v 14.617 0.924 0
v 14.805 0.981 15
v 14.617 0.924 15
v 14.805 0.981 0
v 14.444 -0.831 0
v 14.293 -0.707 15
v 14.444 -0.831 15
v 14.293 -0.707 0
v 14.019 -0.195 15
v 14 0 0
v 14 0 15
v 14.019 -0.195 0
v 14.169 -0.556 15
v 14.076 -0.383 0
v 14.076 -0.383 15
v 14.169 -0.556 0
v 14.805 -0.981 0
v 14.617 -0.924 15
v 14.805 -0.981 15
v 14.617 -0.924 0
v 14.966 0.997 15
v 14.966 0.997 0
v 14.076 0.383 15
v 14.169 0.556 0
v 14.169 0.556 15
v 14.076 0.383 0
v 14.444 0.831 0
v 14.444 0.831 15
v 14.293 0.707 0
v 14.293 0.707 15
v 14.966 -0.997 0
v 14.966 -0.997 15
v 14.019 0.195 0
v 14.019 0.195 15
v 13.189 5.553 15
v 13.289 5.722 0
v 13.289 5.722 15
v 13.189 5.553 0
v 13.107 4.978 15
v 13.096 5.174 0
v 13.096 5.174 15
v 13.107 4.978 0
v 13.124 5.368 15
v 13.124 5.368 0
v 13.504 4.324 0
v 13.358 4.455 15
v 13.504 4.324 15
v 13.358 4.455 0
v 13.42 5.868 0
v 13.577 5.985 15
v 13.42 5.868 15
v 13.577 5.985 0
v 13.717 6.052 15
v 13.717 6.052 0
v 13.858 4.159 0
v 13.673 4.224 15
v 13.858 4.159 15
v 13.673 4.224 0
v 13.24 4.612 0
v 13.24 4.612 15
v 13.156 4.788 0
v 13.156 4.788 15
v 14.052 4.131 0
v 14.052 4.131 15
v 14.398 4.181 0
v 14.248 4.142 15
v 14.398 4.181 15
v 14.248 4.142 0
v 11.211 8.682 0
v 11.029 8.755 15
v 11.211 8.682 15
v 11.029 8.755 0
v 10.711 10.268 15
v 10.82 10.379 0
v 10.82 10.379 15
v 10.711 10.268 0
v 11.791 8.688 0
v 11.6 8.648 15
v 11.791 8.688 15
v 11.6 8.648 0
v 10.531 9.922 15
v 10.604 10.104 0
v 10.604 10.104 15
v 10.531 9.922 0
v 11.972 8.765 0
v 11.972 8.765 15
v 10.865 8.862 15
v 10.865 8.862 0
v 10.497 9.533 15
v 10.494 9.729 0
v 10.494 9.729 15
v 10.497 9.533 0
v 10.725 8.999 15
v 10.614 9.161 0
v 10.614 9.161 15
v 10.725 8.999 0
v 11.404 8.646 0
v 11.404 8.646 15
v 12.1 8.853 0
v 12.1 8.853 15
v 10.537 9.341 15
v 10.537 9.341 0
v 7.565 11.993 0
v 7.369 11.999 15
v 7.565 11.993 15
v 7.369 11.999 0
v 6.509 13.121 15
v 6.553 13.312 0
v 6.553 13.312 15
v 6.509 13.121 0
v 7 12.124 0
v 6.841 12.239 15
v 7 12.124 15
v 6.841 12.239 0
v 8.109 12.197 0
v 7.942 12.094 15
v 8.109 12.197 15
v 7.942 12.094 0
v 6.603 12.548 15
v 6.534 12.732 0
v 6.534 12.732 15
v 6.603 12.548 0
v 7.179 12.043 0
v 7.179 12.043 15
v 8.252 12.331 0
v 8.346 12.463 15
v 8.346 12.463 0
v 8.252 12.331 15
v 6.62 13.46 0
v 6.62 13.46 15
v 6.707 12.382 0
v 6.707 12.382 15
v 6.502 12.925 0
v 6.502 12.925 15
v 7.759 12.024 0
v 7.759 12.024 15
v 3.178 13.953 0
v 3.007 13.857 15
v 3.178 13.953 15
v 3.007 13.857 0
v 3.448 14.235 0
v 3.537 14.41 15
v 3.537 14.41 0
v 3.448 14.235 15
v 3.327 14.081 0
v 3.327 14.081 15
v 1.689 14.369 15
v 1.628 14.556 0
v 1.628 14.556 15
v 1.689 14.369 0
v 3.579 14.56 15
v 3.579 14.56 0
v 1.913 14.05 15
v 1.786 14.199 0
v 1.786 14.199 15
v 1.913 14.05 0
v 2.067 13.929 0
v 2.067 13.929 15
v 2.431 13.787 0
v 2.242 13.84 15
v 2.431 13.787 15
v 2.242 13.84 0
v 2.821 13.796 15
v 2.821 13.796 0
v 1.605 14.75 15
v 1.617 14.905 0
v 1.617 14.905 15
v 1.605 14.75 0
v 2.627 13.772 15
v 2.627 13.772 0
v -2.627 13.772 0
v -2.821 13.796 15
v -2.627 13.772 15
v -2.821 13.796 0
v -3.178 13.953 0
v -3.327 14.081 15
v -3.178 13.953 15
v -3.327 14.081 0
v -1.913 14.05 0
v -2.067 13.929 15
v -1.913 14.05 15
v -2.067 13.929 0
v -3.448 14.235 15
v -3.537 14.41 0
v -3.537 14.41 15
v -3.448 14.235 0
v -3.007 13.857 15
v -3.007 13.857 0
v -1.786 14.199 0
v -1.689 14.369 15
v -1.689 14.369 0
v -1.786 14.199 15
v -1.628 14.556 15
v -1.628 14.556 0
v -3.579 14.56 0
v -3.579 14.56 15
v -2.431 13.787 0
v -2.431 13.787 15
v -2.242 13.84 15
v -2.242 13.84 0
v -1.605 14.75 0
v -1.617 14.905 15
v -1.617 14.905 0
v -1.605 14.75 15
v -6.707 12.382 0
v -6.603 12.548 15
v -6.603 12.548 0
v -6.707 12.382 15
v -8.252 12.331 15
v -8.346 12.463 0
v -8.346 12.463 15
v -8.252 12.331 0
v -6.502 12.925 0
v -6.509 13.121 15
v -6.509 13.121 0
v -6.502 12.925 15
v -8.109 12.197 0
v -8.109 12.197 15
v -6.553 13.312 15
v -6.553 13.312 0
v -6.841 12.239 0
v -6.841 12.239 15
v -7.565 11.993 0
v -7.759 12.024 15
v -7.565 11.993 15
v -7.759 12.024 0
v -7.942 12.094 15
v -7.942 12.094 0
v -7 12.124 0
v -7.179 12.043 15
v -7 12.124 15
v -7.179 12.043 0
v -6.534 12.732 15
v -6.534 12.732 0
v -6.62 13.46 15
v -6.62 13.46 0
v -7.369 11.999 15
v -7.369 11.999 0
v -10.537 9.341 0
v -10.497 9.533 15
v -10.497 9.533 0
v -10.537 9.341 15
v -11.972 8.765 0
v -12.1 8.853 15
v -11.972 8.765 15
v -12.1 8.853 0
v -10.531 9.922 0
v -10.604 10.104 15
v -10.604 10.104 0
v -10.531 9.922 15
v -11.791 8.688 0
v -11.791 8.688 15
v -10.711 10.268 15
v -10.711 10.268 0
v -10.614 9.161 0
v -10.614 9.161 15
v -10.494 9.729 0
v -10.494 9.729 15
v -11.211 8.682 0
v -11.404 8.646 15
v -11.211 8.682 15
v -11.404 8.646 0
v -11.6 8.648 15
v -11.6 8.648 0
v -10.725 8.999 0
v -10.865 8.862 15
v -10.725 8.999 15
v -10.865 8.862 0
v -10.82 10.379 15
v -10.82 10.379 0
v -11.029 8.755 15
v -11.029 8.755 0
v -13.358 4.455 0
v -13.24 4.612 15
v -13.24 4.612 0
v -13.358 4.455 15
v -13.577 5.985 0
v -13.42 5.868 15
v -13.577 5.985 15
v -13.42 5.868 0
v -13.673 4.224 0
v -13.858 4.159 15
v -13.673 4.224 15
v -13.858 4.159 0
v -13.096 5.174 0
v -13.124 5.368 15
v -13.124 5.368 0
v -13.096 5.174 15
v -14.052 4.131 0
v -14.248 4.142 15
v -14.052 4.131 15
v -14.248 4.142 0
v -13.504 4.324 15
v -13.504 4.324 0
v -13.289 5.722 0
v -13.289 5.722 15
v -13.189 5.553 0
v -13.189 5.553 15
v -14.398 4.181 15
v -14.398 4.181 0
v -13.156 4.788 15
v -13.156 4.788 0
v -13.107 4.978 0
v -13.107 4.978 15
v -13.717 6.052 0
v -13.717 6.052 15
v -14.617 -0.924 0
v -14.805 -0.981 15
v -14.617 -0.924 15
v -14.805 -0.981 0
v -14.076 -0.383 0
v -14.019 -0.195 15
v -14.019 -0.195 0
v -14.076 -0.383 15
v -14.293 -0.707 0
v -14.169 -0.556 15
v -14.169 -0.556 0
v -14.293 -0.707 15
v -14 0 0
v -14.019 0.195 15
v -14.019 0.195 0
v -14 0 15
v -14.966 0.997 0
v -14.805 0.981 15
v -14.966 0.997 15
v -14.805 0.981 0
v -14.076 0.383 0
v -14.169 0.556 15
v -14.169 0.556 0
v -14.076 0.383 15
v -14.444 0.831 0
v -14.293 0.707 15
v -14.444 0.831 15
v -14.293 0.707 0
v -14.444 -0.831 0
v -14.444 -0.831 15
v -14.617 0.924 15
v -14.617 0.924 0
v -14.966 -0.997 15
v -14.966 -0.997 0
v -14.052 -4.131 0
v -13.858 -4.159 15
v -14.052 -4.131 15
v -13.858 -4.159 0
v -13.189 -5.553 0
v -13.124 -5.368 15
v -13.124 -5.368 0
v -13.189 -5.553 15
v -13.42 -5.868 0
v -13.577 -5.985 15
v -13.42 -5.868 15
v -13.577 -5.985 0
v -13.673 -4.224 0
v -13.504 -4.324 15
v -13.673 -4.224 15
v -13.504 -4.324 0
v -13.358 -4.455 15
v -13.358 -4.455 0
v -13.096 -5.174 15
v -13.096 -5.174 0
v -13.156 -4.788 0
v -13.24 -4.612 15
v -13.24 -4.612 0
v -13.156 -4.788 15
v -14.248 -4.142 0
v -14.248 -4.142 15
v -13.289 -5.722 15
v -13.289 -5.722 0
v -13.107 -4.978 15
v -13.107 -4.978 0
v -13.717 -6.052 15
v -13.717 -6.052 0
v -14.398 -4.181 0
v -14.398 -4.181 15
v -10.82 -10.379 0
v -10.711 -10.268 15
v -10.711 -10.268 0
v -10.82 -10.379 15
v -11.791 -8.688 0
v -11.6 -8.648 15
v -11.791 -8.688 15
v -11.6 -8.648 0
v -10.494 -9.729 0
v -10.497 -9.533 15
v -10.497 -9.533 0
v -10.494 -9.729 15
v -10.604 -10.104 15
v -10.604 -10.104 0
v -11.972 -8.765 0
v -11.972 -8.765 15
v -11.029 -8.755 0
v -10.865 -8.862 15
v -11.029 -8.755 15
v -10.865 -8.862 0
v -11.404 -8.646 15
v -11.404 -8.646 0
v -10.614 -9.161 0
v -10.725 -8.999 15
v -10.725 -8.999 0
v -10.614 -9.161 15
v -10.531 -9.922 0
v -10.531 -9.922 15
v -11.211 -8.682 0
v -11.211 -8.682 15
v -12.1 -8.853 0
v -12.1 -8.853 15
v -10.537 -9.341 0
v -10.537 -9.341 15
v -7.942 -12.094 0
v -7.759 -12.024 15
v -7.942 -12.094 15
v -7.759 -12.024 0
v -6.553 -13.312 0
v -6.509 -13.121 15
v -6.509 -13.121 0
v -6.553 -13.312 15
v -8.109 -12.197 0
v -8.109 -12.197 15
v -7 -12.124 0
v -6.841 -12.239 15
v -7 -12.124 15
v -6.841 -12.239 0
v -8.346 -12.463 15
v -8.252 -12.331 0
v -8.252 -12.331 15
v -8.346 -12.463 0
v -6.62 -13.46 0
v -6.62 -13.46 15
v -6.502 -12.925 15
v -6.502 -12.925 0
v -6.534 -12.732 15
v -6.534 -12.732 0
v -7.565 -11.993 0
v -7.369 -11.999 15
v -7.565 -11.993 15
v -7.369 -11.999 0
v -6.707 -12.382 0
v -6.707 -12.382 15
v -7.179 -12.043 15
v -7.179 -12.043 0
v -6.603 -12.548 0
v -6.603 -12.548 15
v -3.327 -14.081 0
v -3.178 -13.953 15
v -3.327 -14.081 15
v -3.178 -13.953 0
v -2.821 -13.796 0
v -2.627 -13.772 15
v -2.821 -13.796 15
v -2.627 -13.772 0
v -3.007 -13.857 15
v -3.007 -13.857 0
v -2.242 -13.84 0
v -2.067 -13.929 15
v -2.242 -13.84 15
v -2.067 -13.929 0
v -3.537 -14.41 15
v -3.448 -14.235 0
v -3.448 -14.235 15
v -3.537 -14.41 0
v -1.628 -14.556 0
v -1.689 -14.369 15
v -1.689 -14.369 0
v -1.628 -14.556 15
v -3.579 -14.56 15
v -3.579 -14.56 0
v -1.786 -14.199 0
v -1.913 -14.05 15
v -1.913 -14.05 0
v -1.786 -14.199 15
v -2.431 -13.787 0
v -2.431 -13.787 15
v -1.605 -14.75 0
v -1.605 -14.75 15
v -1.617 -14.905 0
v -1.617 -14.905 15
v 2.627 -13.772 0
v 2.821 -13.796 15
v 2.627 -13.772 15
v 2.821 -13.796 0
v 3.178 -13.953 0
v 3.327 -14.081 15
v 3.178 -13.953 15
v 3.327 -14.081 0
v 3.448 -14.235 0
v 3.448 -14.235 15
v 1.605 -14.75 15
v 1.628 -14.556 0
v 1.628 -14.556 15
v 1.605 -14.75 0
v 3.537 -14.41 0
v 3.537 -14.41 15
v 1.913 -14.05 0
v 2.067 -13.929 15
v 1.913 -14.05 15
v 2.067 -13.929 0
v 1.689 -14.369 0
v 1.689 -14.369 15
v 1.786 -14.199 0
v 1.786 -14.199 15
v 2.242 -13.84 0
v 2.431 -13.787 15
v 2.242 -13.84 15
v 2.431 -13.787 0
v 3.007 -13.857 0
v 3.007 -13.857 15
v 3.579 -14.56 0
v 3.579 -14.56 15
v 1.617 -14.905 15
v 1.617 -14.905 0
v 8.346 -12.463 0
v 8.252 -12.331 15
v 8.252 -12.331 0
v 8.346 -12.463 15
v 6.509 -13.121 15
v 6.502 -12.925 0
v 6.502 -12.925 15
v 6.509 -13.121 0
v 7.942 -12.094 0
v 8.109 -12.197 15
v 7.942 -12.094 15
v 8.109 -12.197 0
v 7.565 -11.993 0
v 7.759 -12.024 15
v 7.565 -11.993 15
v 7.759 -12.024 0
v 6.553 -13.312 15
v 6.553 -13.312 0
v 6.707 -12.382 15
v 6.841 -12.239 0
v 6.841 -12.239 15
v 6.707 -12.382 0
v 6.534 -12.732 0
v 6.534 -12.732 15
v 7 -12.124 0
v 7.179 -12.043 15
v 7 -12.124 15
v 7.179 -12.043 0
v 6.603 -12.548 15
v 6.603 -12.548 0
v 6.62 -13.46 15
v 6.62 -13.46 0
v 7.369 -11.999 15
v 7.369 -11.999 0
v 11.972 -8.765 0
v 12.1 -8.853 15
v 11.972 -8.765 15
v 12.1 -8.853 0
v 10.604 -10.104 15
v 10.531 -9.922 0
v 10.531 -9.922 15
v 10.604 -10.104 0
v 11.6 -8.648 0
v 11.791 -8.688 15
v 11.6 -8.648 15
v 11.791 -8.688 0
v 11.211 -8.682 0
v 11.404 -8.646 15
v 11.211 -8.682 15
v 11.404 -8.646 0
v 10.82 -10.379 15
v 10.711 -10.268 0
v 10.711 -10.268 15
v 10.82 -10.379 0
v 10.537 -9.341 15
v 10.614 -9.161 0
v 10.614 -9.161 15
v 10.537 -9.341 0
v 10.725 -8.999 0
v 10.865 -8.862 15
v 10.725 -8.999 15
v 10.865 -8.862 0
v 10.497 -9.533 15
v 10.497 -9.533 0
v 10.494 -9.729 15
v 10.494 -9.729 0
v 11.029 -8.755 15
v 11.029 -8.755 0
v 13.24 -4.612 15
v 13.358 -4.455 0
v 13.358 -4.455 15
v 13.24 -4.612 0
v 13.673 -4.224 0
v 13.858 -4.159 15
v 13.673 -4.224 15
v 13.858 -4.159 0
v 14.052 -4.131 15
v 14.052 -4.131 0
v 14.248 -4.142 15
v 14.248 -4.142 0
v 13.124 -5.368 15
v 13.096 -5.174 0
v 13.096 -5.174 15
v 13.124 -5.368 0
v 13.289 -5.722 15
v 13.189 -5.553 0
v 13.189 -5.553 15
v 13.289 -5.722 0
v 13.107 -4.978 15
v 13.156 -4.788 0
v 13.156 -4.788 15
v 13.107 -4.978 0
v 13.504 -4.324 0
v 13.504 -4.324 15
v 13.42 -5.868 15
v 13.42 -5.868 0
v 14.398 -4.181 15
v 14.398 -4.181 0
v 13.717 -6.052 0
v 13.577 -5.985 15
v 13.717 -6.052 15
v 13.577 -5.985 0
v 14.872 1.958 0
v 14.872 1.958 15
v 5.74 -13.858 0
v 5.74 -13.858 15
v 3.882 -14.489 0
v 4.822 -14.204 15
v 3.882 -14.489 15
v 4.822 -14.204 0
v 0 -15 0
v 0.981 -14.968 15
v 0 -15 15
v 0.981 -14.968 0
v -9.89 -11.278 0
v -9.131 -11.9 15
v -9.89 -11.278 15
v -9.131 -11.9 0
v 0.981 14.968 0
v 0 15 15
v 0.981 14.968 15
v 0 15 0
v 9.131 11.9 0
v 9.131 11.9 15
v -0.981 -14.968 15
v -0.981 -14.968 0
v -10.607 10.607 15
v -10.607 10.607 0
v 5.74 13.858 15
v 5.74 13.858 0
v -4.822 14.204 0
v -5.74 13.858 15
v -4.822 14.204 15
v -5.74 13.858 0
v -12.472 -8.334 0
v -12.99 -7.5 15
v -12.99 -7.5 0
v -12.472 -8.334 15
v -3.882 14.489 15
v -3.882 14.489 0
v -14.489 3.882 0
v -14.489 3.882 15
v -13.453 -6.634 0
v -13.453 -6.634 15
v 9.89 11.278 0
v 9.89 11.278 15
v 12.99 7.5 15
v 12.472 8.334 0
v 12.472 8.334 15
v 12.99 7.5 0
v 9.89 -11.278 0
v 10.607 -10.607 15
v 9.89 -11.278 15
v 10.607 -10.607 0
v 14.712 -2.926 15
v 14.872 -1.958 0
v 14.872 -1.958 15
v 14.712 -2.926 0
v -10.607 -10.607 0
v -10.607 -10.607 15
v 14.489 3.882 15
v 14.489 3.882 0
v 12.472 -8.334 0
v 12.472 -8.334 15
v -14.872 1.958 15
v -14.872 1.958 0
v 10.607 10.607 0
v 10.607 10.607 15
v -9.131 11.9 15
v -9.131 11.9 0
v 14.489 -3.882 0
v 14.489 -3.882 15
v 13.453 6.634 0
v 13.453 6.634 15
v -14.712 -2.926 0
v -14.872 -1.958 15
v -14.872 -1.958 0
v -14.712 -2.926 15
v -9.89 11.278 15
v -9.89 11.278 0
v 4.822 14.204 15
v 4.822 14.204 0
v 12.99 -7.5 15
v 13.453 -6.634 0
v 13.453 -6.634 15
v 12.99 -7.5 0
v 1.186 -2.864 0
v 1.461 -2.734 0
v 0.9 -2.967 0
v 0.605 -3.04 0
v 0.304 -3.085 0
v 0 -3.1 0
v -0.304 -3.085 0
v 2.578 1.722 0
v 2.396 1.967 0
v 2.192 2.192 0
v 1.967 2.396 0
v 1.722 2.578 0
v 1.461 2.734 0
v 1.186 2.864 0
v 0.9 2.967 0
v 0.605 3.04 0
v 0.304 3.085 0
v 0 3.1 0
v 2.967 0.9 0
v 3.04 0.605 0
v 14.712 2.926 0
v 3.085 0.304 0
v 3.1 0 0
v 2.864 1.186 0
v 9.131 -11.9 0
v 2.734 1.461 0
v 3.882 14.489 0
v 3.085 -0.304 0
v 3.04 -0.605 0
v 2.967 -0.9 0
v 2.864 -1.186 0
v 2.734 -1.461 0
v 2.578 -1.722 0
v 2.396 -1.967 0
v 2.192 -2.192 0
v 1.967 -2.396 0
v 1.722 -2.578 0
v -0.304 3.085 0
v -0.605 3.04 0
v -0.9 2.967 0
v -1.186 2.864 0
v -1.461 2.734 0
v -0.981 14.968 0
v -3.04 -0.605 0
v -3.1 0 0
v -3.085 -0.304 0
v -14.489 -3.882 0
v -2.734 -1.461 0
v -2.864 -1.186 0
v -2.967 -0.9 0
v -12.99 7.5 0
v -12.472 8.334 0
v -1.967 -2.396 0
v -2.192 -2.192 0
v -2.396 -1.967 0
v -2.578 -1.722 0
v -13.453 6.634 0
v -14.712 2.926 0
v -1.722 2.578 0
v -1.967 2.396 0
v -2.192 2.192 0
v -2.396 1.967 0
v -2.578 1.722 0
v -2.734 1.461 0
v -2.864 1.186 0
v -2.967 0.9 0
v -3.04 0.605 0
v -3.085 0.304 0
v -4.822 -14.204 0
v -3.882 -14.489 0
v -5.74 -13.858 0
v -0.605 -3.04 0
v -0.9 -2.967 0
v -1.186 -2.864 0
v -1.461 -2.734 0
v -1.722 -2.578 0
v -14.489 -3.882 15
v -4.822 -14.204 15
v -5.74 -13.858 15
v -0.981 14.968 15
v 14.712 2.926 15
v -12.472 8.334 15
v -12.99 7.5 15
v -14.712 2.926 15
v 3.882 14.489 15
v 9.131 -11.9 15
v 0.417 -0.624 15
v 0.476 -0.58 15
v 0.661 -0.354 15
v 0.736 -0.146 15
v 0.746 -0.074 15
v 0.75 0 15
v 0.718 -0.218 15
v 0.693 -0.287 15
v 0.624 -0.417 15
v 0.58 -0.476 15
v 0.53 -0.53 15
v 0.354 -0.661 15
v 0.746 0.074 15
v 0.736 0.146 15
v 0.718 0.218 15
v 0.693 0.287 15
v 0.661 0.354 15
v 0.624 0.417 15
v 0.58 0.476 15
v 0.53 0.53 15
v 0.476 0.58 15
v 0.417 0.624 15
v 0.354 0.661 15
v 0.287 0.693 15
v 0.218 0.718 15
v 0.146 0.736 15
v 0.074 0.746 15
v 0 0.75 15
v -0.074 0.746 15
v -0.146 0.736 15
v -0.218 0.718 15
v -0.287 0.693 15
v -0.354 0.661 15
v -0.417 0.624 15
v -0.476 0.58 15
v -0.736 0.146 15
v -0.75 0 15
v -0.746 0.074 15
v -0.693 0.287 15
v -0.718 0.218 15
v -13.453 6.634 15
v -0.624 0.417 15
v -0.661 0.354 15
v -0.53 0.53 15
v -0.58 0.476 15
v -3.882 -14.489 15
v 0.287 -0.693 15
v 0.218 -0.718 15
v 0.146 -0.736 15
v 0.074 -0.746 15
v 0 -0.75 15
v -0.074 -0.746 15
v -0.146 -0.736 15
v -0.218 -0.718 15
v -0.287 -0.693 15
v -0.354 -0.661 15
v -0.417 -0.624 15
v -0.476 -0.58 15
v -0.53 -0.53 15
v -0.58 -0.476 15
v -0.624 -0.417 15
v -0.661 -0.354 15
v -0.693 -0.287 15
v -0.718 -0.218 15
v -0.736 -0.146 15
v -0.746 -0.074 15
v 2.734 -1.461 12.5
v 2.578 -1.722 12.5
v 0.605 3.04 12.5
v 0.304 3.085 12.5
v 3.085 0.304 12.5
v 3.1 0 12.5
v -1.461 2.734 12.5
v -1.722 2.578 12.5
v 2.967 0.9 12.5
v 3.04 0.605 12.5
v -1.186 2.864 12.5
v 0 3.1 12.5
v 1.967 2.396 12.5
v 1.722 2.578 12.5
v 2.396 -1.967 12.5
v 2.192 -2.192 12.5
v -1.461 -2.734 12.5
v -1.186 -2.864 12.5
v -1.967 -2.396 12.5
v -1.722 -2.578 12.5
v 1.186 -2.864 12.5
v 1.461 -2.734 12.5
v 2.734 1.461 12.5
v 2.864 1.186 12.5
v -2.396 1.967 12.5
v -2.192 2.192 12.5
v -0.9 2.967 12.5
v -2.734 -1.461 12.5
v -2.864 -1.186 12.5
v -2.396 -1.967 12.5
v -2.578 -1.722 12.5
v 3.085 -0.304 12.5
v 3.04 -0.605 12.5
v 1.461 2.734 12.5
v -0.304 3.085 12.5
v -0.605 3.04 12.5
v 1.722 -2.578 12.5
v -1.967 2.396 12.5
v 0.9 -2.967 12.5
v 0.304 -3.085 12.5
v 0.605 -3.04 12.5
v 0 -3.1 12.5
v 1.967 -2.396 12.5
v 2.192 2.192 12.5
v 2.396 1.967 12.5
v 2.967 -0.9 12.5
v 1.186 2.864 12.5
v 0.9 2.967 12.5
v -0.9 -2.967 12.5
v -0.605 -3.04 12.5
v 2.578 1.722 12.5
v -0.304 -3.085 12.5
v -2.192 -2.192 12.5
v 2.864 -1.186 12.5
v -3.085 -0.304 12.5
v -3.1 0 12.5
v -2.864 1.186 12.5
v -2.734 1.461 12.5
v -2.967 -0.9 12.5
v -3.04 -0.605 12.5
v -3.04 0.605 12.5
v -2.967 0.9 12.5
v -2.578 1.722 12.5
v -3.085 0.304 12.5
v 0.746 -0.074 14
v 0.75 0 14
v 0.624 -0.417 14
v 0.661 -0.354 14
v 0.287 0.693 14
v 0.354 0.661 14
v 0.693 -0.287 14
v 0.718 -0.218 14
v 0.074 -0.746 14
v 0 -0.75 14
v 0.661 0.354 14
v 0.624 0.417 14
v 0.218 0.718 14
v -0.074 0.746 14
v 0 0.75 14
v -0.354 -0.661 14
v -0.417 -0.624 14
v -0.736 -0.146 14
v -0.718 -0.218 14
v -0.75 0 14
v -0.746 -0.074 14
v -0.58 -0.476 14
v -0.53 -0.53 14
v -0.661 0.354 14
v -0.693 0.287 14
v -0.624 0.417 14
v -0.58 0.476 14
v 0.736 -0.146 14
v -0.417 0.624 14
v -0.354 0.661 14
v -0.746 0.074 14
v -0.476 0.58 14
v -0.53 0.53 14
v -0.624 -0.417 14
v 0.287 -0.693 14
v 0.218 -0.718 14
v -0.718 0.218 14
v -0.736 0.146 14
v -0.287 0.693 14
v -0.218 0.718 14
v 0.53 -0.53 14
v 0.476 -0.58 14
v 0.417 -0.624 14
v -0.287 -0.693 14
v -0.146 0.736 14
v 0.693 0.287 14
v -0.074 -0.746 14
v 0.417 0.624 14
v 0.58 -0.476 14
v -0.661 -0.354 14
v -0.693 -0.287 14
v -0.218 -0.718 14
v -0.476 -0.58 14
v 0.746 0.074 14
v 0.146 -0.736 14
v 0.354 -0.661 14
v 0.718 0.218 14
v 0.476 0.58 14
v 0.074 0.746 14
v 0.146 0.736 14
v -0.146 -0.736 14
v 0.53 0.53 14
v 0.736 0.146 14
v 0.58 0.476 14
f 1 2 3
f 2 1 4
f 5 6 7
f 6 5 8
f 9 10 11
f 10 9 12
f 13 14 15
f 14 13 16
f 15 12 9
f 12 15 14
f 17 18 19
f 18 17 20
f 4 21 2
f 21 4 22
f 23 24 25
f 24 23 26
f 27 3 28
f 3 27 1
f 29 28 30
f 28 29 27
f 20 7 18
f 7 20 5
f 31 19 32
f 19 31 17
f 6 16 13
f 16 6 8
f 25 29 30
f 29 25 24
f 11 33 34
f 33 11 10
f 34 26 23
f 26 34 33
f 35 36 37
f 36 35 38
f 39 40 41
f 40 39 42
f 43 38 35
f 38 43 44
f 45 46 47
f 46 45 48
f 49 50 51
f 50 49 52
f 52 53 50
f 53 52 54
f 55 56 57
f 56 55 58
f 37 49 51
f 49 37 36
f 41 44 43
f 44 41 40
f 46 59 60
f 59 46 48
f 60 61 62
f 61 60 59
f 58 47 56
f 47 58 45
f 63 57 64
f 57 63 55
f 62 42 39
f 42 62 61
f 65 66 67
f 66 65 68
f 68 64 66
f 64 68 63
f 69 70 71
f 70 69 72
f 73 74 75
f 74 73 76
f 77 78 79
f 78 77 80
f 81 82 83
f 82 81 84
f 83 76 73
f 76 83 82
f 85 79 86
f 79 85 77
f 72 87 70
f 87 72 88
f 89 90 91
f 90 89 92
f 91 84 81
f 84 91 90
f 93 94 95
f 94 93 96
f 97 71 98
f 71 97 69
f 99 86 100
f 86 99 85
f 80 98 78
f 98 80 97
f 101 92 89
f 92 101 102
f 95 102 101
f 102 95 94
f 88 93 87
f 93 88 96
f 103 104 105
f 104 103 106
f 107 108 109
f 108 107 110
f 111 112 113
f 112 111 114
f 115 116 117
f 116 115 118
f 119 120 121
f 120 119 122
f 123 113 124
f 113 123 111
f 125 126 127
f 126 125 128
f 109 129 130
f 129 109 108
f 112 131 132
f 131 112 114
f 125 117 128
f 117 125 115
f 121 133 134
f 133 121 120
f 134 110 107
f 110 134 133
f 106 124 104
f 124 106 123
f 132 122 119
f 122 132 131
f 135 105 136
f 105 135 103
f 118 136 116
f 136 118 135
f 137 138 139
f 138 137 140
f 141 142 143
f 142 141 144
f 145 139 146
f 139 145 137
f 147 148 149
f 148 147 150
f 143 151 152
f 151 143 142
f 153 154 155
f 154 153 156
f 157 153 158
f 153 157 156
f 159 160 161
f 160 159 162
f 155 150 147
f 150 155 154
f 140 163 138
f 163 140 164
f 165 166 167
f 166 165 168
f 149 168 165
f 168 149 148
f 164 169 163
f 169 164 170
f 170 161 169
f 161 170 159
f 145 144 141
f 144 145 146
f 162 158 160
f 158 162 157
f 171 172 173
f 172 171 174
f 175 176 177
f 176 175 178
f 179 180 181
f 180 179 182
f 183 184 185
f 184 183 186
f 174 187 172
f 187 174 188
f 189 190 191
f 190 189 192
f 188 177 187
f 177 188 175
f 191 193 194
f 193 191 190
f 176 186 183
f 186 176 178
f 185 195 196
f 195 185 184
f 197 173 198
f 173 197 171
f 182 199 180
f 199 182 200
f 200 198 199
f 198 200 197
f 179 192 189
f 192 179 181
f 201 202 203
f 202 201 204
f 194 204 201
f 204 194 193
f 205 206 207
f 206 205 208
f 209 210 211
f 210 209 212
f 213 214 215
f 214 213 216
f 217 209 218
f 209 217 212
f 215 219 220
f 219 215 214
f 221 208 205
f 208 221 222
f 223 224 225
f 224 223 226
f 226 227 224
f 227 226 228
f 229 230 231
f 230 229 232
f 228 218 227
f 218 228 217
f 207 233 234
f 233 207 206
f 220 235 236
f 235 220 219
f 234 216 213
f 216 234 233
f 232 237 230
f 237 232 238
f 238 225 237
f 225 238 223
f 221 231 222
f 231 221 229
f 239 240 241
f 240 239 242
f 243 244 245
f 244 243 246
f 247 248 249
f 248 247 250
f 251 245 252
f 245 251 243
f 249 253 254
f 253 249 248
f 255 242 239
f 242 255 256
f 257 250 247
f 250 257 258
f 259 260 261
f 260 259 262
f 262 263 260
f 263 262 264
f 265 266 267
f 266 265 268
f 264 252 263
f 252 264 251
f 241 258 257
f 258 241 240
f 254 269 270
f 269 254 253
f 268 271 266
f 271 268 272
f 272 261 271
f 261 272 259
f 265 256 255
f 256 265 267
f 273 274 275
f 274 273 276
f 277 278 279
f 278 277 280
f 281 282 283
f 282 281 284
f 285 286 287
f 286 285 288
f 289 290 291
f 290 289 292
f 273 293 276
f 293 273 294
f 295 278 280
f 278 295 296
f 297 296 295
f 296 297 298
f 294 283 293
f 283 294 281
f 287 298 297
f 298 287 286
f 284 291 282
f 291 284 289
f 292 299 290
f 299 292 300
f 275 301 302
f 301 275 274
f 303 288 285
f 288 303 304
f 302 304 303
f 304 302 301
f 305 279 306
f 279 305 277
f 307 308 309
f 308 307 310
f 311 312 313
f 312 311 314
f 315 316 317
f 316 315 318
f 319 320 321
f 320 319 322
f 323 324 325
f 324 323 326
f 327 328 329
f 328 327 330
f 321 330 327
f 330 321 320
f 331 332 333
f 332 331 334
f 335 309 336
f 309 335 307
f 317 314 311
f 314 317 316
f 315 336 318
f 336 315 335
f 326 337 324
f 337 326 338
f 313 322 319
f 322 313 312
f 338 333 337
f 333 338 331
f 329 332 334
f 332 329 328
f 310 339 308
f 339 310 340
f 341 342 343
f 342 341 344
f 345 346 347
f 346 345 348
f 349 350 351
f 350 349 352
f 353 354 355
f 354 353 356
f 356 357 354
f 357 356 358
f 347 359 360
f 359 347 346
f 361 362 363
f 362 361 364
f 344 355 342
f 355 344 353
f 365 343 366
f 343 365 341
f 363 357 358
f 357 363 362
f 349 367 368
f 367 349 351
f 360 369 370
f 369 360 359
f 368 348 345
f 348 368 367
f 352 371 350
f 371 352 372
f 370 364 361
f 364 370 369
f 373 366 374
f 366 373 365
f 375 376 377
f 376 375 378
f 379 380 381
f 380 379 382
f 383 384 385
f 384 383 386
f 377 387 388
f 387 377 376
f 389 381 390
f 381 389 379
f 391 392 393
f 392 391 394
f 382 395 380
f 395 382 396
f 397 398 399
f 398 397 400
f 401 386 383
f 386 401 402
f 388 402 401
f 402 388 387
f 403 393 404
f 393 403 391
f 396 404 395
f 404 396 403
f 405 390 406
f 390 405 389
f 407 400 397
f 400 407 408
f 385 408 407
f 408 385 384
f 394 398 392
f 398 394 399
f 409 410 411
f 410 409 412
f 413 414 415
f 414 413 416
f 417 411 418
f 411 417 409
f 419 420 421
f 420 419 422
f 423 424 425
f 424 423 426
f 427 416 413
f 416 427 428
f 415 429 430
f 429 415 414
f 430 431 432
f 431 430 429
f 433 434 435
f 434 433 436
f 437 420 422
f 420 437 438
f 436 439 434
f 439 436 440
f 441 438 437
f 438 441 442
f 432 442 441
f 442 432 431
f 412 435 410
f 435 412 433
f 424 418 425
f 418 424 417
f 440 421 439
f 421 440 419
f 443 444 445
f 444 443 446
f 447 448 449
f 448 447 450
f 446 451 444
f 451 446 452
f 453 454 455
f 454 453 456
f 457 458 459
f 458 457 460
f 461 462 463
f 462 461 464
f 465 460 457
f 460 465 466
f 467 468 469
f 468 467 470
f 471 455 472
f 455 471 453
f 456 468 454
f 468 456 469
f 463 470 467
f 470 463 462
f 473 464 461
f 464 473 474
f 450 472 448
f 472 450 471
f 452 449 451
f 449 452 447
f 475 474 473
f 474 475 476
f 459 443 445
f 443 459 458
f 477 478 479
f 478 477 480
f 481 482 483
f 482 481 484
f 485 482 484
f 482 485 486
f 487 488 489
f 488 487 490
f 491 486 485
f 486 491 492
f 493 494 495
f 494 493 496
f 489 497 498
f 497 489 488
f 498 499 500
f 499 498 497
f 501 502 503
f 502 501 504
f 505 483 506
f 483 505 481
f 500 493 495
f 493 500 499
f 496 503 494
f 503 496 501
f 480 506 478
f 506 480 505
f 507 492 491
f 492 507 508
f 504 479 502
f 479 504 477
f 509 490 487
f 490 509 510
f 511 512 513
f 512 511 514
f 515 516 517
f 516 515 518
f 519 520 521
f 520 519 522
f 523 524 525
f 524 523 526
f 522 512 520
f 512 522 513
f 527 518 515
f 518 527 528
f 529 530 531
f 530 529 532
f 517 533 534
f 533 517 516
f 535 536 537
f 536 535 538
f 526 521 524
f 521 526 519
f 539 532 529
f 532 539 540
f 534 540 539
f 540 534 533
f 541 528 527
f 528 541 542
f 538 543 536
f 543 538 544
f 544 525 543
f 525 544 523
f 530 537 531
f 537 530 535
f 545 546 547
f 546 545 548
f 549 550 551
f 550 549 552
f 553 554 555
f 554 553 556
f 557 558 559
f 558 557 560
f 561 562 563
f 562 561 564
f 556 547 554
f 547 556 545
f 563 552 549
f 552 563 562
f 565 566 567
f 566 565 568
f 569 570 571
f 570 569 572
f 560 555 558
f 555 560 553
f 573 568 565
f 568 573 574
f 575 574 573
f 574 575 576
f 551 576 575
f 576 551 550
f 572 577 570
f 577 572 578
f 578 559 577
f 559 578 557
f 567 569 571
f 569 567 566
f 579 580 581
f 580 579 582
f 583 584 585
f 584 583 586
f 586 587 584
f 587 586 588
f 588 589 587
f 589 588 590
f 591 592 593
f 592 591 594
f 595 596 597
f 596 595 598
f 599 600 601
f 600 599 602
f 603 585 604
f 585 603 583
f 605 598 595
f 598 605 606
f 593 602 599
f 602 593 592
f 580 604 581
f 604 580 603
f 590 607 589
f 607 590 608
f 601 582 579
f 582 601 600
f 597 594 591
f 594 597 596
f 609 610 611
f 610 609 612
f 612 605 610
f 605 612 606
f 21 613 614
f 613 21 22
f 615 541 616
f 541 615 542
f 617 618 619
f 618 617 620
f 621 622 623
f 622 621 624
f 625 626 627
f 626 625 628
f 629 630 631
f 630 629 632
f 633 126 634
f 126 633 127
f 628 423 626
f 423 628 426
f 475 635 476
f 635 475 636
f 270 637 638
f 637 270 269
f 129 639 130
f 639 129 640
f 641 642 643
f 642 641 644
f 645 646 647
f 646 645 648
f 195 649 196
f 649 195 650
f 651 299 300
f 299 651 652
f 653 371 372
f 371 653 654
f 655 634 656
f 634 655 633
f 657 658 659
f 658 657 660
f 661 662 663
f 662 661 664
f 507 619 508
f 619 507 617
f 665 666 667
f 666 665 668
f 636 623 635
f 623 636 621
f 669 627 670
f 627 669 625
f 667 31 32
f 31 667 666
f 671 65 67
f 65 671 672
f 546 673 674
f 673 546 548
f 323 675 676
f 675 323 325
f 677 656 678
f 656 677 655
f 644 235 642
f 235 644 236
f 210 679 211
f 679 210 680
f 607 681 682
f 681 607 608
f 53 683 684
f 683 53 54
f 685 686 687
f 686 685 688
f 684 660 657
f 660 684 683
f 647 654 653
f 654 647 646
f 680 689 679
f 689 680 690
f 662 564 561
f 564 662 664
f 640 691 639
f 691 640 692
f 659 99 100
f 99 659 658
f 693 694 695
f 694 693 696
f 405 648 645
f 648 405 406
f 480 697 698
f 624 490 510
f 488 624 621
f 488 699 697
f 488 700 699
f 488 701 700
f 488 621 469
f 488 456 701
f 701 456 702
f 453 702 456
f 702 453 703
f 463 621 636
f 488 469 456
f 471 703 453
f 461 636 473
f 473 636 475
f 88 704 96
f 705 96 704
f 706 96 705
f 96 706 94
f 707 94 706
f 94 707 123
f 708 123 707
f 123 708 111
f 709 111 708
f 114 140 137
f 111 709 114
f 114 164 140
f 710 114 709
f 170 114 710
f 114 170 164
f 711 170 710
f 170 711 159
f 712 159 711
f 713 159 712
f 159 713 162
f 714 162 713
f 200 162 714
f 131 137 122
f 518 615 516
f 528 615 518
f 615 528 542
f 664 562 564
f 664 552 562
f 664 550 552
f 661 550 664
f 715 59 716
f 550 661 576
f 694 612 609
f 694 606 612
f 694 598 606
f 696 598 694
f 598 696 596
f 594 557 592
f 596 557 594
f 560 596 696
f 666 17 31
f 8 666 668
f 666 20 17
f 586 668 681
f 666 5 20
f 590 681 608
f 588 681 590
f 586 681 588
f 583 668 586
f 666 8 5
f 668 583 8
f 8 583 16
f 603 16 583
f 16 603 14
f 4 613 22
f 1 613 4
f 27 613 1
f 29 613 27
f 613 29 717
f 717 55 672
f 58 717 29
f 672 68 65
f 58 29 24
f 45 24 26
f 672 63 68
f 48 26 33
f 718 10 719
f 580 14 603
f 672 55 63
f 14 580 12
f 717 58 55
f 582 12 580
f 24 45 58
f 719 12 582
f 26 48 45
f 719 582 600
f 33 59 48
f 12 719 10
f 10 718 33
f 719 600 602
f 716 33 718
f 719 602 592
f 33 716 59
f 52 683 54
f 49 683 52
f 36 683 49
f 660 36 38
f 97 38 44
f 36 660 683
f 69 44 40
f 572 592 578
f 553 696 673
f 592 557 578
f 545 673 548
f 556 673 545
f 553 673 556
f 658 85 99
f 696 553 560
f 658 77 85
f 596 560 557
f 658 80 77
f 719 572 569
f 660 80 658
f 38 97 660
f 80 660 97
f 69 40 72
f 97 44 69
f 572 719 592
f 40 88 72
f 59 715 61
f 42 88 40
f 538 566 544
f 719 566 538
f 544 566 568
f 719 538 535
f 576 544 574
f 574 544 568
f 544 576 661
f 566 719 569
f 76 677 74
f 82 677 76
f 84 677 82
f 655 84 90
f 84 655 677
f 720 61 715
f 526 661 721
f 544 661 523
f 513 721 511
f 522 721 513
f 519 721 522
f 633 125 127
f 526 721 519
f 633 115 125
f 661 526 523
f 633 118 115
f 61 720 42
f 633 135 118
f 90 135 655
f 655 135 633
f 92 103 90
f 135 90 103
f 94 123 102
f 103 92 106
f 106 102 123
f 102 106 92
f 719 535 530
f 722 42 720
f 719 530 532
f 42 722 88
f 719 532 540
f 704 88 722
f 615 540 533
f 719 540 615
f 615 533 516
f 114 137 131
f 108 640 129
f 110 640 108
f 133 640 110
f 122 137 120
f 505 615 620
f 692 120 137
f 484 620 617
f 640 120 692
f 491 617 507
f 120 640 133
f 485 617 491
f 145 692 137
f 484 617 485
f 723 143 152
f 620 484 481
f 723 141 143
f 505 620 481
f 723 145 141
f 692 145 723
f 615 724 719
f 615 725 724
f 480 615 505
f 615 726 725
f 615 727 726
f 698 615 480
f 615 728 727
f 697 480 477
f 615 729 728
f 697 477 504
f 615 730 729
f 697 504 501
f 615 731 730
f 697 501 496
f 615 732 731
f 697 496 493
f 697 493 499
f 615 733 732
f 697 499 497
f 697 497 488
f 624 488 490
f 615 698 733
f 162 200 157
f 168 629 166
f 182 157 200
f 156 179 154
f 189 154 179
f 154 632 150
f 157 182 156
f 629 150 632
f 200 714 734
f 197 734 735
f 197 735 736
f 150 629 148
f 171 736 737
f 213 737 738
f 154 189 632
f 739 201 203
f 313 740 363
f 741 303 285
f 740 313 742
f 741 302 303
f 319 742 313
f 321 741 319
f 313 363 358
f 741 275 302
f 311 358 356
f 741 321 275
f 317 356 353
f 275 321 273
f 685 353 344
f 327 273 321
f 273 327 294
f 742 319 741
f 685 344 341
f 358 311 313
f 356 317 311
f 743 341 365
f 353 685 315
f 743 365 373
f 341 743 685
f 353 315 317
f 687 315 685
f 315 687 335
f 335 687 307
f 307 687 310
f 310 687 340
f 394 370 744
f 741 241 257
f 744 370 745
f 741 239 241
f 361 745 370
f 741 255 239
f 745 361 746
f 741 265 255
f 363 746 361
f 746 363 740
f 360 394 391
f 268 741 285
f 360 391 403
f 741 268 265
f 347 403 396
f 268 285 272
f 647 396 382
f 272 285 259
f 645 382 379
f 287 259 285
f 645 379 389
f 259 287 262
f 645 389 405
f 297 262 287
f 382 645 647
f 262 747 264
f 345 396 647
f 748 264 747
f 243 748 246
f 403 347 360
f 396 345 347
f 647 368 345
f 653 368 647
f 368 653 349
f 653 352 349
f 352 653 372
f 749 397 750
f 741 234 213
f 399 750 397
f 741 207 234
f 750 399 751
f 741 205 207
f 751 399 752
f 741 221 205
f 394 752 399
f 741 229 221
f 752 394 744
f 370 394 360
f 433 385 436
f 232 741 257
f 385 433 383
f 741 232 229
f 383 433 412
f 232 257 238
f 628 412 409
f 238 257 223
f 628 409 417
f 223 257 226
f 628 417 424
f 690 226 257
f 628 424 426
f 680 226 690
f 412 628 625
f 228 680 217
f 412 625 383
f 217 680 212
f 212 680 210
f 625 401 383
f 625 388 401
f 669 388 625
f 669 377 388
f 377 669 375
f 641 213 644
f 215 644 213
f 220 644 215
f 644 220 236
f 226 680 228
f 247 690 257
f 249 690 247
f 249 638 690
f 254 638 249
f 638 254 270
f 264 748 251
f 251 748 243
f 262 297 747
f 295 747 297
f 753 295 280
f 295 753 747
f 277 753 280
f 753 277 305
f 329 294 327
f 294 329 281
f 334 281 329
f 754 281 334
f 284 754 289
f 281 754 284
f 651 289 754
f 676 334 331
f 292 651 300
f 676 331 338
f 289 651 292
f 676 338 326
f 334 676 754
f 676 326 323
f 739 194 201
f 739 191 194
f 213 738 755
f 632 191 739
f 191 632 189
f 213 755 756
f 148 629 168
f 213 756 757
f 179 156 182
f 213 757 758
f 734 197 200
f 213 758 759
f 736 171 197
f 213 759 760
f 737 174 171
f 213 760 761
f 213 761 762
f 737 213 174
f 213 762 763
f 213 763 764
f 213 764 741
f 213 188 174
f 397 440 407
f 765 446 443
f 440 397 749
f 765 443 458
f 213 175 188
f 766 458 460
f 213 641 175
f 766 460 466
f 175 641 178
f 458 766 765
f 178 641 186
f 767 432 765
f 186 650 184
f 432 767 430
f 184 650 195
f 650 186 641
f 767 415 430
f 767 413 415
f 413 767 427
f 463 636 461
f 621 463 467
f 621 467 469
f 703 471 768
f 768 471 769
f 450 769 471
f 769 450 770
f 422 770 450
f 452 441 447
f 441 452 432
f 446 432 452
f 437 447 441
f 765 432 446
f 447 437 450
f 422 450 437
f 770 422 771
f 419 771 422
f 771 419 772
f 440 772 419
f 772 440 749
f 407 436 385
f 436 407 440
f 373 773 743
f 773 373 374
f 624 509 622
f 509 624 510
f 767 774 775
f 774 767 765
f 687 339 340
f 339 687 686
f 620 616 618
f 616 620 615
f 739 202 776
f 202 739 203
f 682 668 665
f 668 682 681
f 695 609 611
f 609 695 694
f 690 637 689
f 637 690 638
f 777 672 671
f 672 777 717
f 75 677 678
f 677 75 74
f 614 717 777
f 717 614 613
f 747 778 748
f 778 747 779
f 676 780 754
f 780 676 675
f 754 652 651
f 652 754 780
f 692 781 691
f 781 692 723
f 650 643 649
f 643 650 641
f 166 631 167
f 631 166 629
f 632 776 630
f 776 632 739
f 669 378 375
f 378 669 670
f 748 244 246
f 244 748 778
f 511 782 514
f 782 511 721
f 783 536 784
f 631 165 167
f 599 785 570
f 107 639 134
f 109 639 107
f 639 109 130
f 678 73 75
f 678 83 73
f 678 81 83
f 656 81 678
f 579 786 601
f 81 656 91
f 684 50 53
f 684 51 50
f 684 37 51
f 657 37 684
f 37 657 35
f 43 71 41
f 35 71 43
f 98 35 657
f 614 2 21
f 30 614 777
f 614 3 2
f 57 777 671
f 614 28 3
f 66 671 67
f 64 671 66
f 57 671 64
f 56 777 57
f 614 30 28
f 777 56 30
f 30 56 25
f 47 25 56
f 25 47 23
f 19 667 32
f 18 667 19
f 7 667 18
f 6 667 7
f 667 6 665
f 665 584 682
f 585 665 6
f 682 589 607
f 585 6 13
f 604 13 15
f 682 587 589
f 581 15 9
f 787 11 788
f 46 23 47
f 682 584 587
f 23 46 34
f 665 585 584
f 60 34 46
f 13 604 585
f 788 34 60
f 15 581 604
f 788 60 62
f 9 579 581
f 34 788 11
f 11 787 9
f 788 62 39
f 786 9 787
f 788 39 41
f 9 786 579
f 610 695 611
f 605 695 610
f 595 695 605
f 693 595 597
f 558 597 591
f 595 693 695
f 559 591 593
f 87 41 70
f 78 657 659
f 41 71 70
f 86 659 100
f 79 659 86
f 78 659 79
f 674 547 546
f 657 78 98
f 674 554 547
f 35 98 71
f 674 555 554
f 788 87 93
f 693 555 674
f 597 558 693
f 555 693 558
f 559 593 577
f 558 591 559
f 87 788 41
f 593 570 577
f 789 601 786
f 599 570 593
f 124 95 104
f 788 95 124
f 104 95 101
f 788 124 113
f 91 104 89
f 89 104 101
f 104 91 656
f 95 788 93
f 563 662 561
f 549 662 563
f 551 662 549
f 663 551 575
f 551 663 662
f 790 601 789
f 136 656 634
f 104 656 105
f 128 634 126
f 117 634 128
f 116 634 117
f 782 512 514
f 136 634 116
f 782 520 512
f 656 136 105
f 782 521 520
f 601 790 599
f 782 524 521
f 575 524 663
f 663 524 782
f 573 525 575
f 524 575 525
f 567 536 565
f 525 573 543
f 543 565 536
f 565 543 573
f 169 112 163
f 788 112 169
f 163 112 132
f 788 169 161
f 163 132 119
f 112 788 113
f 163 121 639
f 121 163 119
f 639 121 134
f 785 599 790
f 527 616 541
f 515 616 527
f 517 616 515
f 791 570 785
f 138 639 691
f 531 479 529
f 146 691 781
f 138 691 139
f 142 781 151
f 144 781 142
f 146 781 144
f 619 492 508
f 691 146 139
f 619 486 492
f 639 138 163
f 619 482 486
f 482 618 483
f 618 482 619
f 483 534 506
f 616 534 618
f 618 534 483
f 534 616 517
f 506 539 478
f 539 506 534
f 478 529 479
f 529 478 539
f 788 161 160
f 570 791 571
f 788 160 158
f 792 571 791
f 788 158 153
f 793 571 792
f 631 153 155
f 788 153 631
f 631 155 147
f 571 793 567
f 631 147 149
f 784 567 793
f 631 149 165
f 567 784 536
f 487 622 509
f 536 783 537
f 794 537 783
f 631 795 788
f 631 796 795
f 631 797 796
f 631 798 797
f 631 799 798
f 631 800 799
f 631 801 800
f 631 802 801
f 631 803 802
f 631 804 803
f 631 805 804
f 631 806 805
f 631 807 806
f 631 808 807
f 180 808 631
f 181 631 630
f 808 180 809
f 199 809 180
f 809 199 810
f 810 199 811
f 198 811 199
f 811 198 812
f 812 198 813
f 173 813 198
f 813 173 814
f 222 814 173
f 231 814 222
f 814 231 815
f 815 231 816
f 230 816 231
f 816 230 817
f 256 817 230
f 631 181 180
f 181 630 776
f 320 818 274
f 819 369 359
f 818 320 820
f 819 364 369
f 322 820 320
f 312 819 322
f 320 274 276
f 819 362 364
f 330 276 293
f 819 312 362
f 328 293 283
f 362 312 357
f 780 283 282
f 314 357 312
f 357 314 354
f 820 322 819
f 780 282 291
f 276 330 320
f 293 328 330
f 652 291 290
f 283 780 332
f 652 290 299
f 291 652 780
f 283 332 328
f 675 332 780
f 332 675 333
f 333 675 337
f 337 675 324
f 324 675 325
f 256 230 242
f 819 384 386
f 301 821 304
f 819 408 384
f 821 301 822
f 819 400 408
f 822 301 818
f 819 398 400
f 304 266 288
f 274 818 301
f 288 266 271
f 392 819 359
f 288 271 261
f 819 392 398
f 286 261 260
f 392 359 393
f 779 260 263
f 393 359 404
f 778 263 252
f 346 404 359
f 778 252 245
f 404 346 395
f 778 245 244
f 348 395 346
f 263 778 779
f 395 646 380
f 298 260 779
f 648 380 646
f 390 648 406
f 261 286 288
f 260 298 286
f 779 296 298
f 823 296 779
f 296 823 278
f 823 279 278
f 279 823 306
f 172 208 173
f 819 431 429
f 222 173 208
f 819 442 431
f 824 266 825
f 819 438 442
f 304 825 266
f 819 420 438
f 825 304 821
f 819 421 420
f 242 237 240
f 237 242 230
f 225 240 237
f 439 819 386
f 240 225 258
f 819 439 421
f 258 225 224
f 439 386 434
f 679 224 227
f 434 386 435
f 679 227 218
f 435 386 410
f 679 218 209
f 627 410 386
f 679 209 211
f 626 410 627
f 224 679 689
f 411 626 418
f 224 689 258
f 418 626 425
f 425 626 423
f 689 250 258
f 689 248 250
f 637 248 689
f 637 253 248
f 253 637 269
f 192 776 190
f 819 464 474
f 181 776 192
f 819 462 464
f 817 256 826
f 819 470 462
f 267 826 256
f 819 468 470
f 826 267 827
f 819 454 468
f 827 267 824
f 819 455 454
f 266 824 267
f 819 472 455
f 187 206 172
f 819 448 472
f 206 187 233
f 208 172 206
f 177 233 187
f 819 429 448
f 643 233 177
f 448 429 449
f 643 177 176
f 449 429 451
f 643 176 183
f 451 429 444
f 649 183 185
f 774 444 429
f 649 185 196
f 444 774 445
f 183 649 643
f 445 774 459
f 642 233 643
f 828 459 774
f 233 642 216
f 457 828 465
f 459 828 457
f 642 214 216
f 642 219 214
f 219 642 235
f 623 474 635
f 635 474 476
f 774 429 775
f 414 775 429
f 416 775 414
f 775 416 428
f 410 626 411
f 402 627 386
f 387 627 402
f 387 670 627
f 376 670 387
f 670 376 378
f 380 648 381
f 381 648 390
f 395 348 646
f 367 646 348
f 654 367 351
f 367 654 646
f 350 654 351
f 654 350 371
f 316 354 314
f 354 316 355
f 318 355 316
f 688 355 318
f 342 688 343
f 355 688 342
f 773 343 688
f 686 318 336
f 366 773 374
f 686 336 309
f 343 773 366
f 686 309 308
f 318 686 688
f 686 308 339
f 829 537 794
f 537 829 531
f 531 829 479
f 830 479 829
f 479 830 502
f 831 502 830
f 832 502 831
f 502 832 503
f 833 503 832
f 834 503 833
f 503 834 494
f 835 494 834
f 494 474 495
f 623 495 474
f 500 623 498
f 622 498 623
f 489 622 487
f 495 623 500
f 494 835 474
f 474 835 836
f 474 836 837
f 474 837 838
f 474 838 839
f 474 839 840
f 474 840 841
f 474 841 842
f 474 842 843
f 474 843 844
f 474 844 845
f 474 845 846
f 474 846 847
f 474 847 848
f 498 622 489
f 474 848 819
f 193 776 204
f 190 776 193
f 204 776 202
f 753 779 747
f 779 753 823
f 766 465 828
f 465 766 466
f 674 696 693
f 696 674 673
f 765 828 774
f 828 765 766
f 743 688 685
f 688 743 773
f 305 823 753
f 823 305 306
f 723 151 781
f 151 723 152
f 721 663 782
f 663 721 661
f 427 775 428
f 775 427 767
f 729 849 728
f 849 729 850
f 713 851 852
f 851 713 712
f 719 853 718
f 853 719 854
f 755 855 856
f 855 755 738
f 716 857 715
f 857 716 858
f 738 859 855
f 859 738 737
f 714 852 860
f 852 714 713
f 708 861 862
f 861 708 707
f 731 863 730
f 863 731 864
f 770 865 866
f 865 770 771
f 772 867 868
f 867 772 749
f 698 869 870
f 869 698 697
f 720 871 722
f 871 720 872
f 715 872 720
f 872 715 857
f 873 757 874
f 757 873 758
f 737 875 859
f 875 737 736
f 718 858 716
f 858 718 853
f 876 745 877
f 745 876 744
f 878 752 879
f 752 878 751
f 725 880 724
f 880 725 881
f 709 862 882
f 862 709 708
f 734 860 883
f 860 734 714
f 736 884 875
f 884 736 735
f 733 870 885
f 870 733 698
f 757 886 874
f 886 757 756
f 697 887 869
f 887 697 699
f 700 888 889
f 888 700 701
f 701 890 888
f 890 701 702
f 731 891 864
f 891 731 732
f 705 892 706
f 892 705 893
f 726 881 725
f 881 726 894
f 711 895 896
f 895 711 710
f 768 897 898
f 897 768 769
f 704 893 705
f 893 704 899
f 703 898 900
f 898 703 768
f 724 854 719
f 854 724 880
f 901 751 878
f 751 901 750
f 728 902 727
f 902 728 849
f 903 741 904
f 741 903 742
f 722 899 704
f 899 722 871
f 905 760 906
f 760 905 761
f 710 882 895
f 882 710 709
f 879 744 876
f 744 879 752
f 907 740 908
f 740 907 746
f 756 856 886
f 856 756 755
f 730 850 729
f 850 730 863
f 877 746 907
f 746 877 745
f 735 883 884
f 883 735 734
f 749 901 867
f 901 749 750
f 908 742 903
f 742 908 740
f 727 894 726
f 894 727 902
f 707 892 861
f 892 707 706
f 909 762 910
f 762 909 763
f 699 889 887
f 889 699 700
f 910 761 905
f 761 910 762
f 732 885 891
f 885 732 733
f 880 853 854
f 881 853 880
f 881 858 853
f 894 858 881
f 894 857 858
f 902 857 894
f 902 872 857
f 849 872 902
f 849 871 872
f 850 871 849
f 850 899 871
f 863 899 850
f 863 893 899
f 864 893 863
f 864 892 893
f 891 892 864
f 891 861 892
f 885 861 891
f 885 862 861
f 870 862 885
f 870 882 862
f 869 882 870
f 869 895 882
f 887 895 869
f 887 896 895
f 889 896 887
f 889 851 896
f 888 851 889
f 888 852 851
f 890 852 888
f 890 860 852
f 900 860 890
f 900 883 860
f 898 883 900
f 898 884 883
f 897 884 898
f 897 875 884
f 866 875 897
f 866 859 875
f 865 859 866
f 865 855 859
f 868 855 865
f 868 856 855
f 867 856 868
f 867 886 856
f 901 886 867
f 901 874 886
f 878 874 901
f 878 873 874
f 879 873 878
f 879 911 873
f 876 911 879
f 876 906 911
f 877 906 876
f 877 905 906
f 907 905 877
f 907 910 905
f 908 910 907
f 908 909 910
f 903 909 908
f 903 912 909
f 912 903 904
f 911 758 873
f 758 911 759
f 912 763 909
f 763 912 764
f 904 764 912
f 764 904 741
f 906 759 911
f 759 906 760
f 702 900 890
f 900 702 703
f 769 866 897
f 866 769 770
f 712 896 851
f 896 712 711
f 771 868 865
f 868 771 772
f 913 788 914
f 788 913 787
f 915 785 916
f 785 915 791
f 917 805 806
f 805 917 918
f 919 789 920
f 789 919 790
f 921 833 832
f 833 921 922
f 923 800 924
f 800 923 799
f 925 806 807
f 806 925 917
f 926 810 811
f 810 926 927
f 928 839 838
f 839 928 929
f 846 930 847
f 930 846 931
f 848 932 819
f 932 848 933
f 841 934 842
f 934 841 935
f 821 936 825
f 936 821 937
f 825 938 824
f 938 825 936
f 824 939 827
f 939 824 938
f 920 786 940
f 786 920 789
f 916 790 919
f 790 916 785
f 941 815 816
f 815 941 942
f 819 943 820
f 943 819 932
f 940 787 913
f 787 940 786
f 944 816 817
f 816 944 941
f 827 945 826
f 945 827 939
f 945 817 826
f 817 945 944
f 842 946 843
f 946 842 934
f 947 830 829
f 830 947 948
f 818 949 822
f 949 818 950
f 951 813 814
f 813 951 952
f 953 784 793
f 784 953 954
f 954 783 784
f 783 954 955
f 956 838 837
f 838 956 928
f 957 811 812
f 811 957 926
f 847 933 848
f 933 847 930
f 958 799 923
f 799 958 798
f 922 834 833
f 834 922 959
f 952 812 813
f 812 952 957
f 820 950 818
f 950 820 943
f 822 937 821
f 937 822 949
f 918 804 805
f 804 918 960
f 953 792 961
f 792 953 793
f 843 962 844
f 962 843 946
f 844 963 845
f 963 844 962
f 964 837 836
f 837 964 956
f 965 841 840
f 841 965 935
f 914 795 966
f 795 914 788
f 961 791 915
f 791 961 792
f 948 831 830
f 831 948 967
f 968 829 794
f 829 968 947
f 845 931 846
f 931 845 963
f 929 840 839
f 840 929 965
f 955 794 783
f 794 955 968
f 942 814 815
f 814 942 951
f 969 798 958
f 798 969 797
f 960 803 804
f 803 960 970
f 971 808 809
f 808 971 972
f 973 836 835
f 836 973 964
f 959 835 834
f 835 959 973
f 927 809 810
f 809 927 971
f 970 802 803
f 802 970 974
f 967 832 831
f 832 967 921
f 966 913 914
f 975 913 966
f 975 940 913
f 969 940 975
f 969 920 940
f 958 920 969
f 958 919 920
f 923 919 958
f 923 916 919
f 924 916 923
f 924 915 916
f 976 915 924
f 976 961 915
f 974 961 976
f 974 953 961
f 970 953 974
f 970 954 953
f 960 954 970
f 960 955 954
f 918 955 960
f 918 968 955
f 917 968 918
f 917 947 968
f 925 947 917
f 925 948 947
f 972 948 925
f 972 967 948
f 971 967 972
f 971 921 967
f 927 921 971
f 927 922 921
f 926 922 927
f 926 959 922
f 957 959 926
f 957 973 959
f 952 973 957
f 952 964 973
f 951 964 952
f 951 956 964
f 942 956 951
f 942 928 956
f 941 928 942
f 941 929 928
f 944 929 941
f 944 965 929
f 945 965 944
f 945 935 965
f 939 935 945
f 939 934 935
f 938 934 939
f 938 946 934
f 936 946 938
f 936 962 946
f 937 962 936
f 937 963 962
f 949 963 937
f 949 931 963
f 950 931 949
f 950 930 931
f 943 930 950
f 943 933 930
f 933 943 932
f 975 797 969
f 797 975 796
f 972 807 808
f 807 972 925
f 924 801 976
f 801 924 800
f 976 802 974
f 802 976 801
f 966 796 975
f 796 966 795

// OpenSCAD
// Replacement knob for hotplate stirrer with D-shaft
// Print orientation: bottom face (with D-bore) on bed, z = 0

// ---- Dimensions ----
knob_d        = 30;    // knob outer diameter
knob_h        = 15;    // knob height
bore_depth    = 12;    // D-bore depth from bottom face
shaft_d       = 6.2;   // D-shaft diameter
bore_flat     = 4.7;   // distance from D-bore flat to opposite side
groove_count  = 18;    // number of grip grooves
groove_d      = 2;     // grip groove diameter (half-cylinder)
pointer_w     = 1.5;   // pointer groove width
pointer_d     = 1;     // pointer groove depth
eps           = 0.5;   // cutter overshoot past faces

$fn = 96;

// ---- Model ----
difference() {
    // Main knob body
    cylinder(d = knob_d, h = knob_h);

    // D-shaped blind bore from bottom face
    translate([0, 0, -eps])
        cylinder(d = shaft_d, h = bore_depth + 2 * eps, $fn = 64);

    // Vertical grip grooves around full height
    for (i = [0 : groove_count - 1])
        rotate([0, 0, i * 360 / groove_count])
            translate([knob_d / 2, 0, -eps])
                cylinder(d = groove_d, h = knob_h + 2 * eps, $fn = 32);

    // Pointer groove on top face, centre to outer edge
    translate([0, 0, knob_h - pointer_d])
        linear_extrude(height = pointer_d + eps)
            circle(d = pointer_w, $fn = 64);
}
